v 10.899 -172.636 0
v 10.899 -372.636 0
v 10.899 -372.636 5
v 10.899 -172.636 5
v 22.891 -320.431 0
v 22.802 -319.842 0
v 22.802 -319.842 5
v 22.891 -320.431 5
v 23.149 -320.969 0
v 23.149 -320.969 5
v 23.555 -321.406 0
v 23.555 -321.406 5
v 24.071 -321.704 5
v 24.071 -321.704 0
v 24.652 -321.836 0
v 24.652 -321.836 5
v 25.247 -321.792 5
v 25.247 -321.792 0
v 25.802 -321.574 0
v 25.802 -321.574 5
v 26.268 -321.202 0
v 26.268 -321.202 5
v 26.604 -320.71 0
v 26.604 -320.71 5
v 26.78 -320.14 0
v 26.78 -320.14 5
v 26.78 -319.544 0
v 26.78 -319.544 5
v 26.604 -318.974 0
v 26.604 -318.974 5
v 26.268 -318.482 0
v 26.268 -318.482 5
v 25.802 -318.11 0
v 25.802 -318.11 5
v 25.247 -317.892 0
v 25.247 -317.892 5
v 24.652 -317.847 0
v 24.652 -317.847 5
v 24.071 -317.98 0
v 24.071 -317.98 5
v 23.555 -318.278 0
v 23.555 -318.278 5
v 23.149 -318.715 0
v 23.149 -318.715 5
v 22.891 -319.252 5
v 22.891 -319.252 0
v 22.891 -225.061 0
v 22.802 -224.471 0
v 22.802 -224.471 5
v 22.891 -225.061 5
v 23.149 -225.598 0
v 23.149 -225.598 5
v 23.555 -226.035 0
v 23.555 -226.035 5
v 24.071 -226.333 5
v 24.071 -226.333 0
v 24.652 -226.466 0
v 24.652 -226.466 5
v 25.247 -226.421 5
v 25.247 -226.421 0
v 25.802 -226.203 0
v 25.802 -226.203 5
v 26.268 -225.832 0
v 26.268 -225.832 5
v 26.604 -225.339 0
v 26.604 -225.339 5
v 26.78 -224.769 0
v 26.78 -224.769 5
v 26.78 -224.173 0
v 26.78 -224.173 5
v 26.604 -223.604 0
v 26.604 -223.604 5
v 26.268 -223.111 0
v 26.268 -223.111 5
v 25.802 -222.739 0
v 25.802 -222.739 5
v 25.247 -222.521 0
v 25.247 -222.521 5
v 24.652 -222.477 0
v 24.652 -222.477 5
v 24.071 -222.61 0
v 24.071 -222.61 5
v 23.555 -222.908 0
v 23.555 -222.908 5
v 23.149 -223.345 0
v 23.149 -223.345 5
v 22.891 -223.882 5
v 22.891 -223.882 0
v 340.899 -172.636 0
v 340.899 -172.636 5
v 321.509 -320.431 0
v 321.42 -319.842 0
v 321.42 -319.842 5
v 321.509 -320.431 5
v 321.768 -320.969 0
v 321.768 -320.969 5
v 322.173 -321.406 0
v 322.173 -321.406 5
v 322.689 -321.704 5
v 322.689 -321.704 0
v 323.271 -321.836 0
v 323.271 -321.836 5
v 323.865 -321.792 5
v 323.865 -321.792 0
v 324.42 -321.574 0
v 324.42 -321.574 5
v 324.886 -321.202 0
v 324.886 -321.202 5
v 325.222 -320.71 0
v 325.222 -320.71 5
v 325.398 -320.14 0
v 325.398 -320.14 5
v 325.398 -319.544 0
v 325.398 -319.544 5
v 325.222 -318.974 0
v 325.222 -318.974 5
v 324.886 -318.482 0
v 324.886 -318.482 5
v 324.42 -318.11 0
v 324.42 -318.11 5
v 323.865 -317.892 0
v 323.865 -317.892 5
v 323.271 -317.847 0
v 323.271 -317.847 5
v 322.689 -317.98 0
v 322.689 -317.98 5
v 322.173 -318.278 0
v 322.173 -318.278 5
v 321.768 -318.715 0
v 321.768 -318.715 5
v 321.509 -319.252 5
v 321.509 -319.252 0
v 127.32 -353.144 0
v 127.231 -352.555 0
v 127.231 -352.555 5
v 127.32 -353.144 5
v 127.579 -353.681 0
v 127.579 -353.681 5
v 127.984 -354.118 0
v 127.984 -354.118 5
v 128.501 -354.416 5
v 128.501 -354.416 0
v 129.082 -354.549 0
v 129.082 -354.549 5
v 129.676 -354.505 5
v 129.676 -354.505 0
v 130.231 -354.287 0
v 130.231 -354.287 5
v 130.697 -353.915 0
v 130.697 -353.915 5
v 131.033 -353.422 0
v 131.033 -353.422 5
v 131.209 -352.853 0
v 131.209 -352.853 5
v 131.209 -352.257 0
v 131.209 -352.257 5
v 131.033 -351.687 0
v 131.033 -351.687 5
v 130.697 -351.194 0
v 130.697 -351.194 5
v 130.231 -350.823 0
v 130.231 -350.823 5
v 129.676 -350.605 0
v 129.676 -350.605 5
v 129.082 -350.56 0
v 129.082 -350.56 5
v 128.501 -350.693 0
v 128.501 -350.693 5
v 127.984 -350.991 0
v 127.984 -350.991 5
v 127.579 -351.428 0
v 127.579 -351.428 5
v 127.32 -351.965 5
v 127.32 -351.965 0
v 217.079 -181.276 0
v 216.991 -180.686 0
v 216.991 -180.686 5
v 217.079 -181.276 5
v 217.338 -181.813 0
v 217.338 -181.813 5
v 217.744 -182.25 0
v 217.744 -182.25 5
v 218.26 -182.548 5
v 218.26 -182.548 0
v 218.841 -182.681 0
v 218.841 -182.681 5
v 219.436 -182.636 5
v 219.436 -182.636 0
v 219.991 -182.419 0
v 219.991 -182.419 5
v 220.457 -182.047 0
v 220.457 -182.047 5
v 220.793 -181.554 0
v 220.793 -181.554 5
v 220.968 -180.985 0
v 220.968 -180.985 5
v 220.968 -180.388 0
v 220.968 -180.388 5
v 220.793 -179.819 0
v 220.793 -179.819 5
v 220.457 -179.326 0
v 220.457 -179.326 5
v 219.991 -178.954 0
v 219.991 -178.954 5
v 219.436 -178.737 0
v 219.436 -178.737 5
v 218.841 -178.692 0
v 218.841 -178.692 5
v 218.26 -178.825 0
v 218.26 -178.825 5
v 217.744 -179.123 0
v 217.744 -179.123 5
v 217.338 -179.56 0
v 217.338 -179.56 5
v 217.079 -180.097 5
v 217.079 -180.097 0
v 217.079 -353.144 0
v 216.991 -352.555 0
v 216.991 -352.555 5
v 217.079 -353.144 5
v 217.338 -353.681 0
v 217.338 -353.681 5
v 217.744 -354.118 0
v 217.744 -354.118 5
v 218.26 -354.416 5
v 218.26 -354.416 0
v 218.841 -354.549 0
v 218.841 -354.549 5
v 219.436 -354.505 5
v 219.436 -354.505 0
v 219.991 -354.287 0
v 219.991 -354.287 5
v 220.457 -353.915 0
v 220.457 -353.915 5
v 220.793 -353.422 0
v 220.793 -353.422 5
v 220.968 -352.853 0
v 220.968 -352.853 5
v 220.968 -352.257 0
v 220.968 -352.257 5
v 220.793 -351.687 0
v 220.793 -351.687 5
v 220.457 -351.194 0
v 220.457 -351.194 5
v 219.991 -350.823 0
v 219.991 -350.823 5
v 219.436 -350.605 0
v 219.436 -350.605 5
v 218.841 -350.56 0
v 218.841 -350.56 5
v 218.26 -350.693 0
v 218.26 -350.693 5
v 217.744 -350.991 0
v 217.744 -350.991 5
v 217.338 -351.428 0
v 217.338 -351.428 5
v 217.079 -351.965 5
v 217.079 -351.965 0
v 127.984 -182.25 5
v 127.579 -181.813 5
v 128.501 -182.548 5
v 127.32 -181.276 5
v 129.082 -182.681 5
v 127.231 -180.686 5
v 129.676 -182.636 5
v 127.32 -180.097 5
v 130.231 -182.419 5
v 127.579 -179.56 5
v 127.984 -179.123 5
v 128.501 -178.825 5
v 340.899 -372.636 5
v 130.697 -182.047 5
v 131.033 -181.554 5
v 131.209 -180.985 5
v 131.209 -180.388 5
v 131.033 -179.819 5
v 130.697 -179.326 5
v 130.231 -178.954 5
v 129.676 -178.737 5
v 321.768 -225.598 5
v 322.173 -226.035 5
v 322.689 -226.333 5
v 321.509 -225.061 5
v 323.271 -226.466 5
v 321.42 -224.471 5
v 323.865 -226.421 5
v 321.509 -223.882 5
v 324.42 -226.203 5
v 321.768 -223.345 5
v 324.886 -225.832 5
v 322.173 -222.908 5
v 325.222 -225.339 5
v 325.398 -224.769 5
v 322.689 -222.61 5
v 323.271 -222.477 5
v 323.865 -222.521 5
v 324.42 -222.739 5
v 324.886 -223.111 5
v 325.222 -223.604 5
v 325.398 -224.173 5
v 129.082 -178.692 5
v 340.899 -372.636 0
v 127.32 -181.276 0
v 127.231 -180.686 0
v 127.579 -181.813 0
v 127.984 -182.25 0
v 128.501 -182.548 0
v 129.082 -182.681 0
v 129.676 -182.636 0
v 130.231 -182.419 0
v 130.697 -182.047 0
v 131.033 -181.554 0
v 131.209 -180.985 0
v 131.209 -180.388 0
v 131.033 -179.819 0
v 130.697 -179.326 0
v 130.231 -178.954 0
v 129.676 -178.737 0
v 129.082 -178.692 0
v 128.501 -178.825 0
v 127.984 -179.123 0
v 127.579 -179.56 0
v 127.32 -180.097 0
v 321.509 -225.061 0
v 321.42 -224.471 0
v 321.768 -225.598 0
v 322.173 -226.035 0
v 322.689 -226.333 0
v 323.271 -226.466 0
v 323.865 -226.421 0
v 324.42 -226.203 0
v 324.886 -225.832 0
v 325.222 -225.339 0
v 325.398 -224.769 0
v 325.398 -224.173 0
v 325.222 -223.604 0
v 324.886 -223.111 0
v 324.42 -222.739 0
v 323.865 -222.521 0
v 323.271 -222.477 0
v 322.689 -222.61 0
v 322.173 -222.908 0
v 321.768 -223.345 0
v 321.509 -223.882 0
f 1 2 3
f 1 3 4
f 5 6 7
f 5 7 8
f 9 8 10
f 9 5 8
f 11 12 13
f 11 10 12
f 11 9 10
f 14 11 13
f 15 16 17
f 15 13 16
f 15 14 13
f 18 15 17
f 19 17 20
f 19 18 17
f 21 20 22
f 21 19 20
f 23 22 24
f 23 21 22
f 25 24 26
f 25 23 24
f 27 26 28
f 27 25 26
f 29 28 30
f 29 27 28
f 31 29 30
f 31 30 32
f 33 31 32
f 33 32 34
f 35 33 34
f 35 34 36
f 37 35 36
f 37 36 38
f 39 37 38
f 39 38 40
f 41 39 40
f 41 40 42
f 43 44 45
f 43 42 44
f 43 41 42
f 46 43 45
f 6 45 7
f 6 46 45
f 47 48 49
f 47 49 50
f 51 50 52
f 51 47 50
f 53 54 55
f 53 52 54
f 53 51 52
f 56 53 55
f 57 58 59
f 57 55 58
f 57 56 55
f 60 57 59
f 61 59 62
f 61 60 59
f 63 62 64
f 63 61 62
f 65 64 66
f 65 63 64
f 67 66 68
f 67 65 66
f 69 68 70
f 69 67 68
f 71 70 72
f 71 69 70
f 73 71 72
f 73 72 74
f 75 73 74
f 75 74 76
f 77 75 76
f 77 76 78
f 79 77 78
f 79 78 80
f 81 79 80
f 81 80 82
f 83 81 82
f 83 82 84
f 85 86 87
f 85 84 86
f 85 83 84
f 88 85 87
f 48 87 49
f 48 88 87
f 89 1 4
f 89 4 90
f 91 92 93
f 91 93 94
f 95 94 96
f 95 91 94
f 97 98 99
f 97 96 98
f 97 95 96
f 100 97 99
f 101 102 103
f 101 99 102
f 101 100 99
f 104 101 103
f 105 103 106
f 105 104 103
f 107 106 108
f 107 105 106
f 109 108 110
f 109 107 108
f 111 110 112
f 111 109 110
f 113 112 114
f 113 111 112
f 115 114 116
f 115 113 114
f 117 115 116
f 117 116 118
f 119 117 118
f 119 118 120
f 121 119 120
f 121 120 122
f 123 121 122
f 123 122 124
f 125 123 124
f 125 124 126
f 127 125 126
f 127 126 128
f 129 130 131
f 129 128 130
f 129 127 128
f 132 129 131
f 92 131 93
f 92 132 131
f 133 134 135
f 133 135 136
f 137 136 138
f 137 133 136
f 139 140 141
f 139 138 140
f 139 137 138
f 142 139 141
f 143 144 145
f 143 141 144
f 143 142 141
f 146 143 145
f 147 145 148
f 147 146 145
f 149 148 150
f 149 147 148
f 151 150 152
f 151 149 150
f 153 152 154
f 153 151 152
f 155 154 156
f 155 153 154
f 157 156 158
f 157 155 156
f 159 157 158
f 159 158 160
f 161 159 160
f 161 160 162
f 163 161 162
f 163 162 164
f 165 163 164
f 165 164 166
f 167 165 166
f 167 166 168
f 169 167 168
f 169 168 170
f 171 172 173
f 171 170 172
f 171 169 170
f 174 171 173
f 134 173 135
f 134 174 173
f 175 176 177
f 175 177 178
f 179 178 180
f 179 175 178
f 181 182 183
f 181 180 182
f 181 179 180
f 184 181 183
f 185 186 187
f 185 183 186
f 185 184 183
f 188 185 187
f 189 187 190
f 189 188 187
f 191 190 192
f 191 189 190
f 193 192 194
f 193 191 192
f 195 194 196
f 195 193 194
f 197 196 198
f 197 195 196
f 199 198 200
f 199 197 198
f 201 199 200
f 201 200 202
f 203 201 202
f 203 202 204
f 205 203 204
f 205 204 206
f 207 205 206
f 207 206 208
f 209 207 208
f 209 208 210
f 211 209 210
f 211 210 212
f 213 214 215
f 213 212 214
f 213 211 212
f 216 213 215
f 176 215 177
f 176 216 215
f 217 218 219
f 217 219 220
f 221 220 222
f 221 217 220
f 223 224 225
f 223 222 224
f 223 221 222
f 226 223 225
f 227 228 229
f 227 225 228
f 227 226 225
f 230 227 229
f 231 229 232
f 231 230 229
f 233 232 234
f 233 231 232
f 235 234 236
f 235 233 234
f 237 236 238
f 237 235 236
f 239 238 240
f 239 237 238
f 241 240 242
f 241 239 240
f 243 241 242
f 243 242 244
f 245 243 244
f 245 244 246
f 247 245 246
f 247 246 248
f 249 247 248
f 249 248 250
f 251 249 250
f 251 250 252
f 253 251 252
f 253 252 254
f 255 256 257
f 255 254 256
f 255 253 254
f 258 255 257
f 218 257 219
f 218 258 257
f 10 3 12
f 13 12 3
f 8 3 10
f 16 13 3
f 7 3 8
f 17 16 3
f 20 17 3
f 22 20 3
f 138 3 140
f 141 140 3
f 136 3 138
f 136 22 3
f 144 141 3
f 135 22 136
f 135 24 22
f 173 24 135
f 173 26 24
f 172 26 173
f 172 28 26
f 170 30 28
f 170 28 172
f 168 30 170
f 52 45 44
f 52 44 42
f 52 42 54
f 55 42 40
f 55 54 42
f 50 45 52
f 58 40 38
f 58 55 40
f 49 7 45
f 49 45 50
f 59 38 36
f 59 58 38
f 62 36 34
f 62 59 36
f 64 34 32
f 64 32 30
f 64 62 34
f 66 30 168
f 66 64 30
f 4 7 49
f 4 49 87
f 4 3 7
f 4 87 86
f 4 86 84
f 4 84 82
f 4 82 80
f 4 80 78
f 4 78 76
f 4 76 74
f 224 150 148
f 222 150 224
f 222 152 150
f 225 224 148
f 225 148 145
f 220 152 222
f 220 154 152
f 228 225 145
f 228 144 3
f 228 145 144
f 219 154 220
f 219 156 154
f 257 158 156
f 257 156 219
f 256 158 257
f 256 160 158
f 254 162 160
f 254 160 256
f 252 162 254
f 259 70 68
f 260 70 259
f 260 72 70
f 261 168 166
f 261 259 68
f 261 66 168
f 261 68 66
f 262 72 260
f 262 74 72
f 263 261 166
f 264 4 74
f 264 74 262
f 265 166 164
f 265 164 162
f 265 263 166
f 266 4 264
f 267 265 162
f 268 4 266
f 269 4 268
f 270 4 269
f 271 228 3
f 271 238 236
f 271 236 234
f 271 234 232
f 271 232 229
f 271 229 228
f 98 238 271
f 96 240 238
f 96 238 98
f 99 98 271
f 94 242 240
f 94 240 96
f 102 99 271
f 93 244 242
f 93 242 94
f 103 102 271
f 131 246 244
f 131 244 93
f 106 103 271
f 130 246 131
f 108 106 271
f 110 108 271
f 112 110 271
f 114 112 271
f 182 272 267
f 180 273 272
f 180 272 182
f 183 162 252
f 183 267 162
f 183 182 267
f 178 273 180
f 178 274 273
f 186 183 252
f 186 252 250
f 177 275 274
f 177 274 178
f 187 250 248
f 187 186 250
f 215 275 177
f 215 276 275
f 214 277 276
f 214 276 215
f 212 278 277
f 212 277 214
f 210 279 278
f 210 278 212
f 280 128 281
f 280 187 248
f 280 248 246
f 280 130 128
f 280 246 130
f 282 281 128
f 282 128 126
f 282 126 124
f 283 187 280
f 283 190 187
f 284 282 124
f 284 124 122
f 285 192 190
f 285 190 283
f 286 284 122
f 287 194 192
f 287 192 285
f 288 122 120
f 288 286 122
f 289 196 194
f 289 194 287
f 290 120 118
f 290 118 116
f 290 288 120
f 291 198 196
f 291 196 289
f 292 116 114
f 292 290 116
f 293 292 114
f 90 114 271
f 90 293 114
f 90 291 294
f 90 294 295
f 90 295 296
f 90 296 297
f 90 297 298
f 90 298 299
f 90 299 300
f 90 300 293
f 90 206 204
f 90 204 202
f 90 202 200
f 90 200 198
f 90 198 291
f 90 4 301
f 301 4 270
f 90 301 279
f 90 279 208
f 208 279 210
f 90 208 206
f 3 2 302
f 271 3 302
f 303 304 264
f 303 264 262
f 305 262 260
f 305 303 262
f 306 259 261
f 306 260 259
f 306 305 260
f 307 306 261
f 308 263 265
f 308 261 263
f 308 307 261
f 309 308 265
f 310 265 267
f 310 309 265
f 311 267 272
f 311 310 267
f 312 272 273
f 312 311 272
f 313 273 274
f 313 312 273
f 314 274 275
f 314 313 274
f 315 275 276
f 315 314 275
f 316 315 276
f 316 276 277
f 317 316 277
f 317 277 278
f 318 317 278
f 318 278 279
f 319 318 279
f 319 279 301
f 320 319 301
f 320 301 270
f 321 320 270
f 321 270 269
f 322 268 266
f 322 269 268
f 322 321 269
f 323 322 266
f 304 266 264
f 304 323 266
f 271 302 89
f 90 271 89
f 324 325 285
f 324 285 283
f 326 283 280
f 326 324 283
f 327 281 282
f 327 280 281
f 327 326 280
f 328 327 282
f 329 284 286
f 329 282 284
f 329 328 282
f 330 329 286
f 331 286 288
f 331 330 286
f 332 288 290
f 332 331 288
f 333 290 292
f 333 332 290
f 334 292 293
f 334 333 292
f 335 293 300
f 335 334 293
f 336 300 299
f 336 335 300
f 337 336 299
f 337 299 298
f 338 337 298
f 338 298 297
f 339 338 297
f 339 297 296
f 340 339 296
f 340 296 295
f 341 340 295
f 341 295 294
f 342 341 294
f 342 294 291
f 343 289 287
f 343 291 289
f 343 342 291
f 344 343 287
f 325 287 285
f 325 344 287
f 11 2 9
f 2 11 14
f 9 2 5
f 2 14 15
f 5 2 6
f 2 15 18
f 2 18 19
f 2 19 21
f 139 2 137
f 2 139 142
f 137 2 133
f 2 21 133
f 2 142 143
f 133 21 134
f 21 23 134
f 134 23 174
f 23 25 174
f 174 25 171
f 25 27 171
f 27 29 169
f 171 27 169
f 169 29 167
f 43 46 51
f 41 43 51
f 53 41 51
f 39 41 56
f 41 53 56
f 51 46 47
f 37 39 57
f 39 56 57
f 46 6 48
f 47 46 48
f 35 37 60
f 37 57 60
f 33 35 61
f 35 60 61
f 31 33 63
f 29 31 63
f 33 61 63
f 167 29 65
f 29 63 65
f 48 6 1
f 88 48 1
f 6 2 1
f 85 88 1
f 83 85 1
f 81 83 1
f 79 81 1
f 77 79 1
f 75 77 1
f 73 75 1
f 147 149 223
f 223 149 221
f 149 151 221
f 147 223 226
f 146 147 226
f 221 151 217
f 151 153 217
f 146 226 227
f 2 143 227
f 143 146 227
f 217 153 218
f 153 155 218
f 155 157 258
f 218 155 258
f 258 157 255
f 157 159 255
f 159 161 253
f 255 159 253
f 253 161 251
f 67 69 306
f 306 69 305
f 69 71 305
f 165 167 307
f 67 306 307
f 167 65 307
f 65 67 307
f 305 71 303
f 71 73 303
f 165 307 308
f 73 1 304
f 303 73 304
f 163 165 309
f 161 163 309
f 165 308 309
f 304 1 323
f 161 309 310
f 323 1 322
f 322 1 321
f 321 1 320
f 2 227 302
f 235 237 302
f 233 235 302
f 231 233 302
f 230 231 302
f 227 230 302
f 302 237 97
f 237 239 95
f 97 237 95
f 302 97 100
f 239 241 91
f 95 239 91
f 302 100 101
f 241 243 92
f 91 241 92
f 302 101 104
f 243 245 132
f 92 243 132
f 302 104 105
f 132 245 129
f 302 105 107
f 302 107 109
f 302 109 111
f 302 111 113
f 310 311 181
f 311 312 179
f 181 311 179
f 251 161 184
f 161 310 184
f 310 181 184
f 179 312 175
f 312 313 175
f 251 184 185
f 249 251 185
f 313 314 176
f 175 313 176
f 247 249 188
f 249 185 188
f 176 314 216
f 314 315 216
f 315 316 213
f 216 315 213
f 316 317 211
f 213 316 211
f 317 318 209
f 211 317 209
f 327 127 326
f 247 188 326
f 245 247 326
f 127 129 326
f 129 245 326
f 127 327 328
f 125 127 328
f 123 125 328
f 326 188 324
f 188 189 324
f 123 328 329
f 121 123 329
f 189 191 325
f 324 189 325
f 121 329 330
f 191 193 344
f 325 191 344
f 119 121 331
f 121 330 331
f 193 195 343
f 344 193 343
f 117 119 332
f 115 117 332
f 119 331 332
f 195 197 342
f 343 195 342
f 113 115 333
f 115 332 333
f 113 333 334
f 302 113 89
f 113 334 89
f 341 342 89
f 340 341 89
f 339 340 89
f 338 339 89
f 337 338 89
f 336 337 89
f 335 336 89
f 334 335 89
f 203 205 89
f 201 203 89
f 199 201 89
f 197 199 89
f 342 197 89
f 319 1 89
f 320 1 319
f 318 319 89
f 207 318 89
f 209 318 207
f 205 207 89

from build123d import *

# Parameters (mm, degrees)
SKETCH1_W               = 330
SKETCH1_H               = 200
BOSS_EXTRUDE1_DEPTH     = 5
CUT_EXTRUDE1_DEPTH      = 110
CUT_EXTRUDE1_DEPTH_BACK = 10
SKETCH2_R               = 2


with BuildPart() as part:
    # Sketch1 → Boss-Extrude1 (new body)
    with BuildSketch(Plane.XY):
        with Locations((175.898578828, -272.636032505)):
            Rectangle(SKETCH1_W, SKETCH1_H)
    extrude(amount=BOSS_EXTRUDE1_DEPTH)

    # Sketch2 → Cut-Extrude1 (cut, two sides: drawn at the far end of the back side and taken through both)
    with BuildSketch(Plane.XY.offset(5).offset(-CUT_EXTRUDE1_DEPTH_BACK)):
        with Locations(Location((24.801887312, -224.471344643, 0), (0, 0, 180))):
            Circle(SKETCH2_R)
        with Locations(Location((24.801887312, -319.841869215, 0), (0, 0, 180))):
            Circle(SKETCH2_R)
        with Locations(Location((129.231353532, -180.68646001, 0), (0, 0, 180))):
            Circle(SKETCH2_R)
        with Locations(Location((129.231353532, -352.554714055, 0), (0, 0, 180))):
            Circle(SKETCH2_R)
        with Locations(Location((218.990638171, -352.554714055, 0), (0, 0, 180))):
            Circle(SKETCH2_R)
        with Locations(Location((323.420104391, -319.841869215, 0), (0, 0, 180))):
            Circle(SKETCH2_R)
        with Locations(Location((323.420104391, -224.471344643, 0), (0, 0, 180))):
            Circle(SKETCH2_R)
        with Locations(Location((218.990638171, -180.68646001, 0), (0, 0, 180))):
            Circle(SKETCH2_R)
    extrude(amount=CUT_EXTRUDE1_DEPTH + CUT_EXTRUDE1_DEPTH_BACK, mode=Mode.SUBTRACT)


solid = part.part
